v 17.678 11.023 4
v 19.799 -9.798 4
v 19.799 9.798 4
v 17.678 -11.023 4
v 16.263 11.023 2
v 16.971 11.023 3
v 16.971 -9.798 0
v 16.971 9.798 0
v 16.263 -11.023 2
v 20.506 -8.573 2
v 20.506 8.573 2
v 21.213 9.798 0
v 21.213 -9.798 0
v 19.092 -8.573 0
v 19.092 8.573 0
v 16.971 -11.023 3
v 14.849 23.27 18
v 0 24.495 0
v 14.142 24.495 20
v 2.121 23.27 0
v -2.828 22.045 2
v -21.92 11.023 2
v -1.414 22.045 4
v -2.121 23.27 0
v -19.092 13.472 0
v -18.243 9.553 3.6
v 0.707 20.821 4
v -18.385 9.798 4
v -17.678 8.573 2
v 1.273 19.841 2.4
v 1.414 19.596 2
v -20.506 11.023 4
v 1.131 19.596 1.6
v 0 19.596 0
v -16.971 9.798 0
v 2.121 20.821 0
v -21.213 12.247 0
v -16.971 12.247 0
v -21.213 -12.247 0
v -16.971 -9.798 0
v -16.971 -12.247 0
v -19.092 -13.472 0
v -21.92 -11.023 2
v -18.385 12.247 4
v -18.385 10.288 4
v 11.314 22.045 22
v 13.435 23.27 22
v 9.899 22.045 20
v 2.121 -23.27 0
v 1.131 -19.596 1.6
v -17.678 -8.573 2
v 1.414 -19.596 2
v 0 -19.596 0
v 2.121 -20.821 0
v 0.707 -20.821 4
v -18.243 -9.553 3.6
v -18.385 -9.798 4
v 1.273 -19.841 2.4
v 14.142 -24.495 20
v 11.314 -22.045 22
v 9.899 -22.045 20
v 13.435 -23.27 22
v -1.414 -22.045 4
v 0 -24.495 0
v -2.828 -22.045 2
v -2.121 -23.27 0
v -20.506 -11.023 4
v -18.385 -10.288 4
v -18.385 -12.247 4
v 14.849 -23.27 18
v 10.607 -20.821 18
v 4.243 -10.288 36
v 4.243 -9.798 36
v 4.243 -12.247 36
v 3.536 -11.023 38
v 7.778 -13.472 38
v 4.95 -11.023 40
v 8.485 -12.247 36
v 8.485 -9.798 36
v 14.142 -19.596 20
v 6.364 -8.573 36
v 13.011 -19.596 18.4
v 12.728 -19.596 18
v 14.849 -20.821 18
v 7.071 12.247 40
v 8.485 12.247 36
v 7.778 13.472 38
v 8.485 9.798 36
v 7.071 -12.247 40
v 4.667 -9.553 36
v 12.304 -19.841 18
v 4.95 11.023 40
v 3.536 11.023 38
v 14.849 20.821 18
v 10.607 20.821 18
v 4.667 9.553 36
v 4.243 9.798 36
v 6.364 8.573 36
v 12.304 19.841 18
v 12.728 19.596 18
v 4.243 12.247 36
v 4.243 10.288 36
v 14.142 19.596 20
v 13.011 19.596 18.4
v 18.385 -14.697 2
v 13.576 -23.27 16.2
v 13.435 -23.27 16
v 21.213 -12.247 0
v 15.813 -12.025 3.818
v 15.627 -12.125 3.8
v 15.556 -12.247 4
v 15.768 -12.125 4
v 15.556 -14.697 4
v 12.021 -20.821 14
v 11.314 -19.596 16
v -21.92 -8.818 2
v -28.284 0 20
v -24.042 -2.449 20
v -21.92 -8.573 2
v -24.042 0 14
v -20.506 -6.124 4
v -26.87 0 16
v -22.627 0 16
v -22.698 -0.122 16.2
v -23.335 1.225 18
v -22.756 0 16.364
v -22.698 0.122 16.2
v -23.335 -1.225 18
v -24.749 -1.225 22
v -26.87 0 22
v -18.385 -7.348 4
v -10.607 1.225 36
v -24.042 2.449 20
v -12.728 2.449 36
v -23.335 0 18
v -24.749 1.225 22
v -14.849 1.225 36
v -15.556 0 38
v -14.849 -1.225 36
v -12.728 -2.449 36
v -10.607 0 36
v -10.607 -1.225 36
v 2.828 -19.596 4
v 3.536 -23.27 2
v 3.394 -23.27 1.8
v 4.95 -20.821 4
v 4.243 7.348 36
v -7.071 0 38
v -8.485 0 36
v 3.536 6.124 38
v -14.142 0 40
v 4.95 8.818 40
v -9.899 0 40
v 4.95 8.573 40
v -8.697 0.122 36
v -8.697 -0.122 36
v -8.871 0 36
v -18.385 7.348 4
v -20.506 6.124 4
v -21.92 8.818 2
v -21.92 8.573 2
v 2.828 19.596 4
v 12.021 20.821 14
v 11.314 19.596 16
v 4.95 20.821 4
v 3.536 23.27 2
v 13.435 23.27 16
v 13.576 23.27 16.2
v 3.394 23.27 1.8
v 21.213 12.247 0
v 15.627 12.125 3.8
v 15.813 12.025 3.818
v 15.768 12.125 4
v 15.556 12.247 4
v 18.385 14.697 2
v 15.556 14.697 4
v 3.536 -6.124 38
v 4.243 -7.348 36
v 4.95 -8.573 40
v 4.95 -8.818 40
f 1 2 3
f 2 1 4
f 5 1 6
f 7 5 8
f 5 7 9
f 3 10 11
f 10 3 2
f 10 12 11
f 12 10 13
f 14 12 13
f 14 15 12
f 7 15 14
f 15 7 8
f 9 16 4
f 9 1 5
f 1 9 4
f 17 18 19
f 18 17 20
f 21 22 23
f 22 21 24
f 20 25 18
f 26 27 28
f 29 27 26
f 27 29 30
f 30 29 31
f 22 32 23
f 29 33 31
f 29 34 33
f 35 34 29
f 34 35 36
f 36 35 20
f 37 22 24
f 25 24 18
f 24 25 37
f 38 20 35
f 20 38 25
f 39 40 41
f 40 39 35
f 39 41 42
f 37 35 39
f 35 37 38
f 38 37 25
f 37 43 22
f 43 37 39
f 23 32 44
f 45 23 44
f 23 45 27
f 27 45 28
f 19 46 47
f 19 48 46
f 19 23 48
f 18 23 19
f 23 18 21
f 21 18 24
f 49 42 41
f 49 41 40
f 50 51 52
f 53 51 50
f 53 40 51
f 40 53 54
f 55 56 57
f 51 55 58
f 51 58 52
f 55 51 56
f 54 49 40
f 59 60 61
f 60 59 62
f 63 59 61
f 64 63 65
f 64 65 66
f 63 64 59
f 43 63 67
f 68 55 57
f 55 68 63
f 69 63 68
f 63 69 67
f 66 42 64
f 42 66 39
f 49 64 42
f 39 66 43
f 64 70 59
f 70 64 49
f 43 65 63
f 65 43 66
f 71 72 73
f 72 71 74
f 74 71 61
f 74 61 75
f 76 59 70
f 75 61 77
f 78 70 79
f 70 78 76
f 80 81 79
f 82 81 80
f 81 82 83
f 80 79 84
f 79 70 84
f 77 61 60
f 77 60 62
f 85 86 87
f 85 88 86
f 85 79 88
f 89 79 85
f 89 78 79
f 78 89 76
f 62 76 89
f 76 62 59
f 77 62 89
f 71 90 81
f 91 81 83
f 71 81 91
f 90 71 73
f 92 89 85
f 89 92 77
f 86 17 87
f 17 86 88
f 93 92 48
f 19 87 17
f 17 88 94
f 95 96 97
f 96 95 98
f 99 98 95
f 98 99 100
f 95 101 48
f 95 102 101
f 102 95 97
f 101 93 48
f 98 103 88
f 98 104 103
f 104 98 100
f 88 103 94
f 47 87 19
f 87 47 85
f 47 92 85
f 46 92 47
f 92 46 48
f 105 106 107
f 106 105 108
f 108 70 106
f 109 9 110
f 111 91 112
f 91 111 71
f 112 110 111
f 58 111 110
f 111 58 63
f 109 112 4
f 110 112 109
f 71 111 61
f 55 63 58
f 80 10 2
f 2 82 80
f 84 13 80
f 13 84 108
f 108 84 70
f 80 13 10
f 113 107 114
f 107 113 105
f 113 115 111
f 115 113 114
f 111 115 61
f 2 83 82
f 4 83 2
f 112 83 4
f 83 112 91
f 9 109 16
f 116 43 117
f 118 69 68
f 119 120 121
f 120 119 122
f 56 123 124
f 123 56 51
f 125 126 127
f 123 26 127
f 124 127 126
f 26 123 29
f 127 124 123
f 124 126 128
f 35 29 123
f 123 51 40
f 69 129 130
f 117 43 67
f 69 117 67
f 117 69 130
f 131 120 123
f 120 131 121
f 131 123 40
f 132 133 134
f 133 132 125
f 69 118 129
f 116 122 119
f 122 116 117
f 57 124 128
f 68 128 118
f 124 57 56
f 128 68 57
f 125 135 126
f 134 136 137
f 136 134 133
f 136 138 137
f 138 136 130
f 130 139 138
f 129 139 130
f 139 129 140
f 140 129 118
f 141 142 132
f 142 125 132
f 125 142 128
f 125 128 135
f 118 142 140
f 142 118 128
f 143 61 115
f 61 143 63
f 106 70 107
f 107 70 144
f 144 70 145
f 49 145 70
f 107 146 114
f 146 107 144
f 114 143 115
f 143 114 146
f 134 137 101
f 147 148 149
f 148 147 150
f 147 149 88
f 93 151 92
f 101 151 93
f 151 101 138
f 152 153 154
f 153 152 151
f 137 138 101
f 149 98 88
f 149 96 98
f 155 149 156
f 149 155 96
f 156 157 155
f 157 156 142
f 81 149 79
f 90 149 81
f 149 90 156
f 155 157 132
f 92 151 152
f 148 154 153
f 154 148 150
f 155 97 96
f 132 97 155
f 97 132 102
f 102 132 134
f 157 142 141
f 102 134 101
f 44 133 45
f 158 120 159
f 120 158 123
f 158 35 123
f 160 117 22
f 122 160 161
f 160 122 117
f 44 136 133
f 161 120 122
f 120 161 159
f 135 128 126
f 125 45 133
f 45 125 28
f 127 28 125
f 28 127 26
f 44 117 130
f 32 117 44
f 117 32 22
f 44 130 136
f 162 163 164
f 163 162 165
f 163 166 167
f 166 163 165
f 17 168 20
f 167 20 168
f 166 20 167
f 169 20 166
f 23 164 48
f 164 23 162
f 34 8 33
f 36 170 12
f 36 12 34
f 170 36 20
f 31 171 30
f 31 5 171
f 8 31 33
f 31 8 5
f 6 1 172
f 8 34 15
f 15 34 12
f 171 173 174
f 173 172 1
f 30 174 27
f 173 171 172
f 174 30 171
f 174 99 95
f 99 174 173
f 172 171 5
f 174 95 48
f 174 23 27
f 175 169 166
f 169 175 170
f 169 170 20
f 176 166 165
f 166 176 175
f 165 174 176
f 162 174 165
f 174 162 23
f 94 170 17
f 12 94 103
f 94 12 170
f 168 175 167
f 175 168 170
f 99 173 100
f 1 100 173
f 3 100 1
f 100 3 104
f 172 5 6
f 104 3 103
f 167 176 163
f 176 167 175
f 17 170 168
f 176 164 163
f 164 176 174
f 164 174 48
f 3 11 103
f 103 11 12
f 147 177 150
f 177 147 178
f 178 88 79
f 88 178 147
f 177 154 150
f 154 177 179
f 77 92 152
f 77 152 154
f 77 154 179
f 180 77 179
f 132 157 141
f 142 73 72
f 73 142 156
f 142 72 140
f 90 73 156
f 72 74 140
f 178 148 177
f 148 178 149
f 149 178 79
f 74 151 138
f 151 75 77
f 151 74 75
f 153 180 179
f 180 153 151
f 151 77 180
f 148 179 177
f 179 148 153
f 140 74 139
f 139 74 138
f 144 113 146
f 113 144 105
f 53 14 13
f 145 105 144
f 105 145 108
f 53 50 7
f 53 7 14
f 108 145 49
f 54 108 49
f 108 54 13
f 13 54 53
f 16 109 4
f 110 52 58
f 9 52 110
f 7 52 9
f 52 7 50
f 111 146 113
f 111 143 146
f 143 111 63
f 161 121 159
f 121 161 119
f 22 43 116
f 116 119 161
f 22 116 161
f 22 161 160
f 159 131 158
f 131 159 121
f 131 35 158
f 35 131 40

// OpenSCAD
// shape height
sh = 30;
// border width
bw = 3;

include <../polyhedra.scad>;

poly_wire(truncated_tetrahedron);
